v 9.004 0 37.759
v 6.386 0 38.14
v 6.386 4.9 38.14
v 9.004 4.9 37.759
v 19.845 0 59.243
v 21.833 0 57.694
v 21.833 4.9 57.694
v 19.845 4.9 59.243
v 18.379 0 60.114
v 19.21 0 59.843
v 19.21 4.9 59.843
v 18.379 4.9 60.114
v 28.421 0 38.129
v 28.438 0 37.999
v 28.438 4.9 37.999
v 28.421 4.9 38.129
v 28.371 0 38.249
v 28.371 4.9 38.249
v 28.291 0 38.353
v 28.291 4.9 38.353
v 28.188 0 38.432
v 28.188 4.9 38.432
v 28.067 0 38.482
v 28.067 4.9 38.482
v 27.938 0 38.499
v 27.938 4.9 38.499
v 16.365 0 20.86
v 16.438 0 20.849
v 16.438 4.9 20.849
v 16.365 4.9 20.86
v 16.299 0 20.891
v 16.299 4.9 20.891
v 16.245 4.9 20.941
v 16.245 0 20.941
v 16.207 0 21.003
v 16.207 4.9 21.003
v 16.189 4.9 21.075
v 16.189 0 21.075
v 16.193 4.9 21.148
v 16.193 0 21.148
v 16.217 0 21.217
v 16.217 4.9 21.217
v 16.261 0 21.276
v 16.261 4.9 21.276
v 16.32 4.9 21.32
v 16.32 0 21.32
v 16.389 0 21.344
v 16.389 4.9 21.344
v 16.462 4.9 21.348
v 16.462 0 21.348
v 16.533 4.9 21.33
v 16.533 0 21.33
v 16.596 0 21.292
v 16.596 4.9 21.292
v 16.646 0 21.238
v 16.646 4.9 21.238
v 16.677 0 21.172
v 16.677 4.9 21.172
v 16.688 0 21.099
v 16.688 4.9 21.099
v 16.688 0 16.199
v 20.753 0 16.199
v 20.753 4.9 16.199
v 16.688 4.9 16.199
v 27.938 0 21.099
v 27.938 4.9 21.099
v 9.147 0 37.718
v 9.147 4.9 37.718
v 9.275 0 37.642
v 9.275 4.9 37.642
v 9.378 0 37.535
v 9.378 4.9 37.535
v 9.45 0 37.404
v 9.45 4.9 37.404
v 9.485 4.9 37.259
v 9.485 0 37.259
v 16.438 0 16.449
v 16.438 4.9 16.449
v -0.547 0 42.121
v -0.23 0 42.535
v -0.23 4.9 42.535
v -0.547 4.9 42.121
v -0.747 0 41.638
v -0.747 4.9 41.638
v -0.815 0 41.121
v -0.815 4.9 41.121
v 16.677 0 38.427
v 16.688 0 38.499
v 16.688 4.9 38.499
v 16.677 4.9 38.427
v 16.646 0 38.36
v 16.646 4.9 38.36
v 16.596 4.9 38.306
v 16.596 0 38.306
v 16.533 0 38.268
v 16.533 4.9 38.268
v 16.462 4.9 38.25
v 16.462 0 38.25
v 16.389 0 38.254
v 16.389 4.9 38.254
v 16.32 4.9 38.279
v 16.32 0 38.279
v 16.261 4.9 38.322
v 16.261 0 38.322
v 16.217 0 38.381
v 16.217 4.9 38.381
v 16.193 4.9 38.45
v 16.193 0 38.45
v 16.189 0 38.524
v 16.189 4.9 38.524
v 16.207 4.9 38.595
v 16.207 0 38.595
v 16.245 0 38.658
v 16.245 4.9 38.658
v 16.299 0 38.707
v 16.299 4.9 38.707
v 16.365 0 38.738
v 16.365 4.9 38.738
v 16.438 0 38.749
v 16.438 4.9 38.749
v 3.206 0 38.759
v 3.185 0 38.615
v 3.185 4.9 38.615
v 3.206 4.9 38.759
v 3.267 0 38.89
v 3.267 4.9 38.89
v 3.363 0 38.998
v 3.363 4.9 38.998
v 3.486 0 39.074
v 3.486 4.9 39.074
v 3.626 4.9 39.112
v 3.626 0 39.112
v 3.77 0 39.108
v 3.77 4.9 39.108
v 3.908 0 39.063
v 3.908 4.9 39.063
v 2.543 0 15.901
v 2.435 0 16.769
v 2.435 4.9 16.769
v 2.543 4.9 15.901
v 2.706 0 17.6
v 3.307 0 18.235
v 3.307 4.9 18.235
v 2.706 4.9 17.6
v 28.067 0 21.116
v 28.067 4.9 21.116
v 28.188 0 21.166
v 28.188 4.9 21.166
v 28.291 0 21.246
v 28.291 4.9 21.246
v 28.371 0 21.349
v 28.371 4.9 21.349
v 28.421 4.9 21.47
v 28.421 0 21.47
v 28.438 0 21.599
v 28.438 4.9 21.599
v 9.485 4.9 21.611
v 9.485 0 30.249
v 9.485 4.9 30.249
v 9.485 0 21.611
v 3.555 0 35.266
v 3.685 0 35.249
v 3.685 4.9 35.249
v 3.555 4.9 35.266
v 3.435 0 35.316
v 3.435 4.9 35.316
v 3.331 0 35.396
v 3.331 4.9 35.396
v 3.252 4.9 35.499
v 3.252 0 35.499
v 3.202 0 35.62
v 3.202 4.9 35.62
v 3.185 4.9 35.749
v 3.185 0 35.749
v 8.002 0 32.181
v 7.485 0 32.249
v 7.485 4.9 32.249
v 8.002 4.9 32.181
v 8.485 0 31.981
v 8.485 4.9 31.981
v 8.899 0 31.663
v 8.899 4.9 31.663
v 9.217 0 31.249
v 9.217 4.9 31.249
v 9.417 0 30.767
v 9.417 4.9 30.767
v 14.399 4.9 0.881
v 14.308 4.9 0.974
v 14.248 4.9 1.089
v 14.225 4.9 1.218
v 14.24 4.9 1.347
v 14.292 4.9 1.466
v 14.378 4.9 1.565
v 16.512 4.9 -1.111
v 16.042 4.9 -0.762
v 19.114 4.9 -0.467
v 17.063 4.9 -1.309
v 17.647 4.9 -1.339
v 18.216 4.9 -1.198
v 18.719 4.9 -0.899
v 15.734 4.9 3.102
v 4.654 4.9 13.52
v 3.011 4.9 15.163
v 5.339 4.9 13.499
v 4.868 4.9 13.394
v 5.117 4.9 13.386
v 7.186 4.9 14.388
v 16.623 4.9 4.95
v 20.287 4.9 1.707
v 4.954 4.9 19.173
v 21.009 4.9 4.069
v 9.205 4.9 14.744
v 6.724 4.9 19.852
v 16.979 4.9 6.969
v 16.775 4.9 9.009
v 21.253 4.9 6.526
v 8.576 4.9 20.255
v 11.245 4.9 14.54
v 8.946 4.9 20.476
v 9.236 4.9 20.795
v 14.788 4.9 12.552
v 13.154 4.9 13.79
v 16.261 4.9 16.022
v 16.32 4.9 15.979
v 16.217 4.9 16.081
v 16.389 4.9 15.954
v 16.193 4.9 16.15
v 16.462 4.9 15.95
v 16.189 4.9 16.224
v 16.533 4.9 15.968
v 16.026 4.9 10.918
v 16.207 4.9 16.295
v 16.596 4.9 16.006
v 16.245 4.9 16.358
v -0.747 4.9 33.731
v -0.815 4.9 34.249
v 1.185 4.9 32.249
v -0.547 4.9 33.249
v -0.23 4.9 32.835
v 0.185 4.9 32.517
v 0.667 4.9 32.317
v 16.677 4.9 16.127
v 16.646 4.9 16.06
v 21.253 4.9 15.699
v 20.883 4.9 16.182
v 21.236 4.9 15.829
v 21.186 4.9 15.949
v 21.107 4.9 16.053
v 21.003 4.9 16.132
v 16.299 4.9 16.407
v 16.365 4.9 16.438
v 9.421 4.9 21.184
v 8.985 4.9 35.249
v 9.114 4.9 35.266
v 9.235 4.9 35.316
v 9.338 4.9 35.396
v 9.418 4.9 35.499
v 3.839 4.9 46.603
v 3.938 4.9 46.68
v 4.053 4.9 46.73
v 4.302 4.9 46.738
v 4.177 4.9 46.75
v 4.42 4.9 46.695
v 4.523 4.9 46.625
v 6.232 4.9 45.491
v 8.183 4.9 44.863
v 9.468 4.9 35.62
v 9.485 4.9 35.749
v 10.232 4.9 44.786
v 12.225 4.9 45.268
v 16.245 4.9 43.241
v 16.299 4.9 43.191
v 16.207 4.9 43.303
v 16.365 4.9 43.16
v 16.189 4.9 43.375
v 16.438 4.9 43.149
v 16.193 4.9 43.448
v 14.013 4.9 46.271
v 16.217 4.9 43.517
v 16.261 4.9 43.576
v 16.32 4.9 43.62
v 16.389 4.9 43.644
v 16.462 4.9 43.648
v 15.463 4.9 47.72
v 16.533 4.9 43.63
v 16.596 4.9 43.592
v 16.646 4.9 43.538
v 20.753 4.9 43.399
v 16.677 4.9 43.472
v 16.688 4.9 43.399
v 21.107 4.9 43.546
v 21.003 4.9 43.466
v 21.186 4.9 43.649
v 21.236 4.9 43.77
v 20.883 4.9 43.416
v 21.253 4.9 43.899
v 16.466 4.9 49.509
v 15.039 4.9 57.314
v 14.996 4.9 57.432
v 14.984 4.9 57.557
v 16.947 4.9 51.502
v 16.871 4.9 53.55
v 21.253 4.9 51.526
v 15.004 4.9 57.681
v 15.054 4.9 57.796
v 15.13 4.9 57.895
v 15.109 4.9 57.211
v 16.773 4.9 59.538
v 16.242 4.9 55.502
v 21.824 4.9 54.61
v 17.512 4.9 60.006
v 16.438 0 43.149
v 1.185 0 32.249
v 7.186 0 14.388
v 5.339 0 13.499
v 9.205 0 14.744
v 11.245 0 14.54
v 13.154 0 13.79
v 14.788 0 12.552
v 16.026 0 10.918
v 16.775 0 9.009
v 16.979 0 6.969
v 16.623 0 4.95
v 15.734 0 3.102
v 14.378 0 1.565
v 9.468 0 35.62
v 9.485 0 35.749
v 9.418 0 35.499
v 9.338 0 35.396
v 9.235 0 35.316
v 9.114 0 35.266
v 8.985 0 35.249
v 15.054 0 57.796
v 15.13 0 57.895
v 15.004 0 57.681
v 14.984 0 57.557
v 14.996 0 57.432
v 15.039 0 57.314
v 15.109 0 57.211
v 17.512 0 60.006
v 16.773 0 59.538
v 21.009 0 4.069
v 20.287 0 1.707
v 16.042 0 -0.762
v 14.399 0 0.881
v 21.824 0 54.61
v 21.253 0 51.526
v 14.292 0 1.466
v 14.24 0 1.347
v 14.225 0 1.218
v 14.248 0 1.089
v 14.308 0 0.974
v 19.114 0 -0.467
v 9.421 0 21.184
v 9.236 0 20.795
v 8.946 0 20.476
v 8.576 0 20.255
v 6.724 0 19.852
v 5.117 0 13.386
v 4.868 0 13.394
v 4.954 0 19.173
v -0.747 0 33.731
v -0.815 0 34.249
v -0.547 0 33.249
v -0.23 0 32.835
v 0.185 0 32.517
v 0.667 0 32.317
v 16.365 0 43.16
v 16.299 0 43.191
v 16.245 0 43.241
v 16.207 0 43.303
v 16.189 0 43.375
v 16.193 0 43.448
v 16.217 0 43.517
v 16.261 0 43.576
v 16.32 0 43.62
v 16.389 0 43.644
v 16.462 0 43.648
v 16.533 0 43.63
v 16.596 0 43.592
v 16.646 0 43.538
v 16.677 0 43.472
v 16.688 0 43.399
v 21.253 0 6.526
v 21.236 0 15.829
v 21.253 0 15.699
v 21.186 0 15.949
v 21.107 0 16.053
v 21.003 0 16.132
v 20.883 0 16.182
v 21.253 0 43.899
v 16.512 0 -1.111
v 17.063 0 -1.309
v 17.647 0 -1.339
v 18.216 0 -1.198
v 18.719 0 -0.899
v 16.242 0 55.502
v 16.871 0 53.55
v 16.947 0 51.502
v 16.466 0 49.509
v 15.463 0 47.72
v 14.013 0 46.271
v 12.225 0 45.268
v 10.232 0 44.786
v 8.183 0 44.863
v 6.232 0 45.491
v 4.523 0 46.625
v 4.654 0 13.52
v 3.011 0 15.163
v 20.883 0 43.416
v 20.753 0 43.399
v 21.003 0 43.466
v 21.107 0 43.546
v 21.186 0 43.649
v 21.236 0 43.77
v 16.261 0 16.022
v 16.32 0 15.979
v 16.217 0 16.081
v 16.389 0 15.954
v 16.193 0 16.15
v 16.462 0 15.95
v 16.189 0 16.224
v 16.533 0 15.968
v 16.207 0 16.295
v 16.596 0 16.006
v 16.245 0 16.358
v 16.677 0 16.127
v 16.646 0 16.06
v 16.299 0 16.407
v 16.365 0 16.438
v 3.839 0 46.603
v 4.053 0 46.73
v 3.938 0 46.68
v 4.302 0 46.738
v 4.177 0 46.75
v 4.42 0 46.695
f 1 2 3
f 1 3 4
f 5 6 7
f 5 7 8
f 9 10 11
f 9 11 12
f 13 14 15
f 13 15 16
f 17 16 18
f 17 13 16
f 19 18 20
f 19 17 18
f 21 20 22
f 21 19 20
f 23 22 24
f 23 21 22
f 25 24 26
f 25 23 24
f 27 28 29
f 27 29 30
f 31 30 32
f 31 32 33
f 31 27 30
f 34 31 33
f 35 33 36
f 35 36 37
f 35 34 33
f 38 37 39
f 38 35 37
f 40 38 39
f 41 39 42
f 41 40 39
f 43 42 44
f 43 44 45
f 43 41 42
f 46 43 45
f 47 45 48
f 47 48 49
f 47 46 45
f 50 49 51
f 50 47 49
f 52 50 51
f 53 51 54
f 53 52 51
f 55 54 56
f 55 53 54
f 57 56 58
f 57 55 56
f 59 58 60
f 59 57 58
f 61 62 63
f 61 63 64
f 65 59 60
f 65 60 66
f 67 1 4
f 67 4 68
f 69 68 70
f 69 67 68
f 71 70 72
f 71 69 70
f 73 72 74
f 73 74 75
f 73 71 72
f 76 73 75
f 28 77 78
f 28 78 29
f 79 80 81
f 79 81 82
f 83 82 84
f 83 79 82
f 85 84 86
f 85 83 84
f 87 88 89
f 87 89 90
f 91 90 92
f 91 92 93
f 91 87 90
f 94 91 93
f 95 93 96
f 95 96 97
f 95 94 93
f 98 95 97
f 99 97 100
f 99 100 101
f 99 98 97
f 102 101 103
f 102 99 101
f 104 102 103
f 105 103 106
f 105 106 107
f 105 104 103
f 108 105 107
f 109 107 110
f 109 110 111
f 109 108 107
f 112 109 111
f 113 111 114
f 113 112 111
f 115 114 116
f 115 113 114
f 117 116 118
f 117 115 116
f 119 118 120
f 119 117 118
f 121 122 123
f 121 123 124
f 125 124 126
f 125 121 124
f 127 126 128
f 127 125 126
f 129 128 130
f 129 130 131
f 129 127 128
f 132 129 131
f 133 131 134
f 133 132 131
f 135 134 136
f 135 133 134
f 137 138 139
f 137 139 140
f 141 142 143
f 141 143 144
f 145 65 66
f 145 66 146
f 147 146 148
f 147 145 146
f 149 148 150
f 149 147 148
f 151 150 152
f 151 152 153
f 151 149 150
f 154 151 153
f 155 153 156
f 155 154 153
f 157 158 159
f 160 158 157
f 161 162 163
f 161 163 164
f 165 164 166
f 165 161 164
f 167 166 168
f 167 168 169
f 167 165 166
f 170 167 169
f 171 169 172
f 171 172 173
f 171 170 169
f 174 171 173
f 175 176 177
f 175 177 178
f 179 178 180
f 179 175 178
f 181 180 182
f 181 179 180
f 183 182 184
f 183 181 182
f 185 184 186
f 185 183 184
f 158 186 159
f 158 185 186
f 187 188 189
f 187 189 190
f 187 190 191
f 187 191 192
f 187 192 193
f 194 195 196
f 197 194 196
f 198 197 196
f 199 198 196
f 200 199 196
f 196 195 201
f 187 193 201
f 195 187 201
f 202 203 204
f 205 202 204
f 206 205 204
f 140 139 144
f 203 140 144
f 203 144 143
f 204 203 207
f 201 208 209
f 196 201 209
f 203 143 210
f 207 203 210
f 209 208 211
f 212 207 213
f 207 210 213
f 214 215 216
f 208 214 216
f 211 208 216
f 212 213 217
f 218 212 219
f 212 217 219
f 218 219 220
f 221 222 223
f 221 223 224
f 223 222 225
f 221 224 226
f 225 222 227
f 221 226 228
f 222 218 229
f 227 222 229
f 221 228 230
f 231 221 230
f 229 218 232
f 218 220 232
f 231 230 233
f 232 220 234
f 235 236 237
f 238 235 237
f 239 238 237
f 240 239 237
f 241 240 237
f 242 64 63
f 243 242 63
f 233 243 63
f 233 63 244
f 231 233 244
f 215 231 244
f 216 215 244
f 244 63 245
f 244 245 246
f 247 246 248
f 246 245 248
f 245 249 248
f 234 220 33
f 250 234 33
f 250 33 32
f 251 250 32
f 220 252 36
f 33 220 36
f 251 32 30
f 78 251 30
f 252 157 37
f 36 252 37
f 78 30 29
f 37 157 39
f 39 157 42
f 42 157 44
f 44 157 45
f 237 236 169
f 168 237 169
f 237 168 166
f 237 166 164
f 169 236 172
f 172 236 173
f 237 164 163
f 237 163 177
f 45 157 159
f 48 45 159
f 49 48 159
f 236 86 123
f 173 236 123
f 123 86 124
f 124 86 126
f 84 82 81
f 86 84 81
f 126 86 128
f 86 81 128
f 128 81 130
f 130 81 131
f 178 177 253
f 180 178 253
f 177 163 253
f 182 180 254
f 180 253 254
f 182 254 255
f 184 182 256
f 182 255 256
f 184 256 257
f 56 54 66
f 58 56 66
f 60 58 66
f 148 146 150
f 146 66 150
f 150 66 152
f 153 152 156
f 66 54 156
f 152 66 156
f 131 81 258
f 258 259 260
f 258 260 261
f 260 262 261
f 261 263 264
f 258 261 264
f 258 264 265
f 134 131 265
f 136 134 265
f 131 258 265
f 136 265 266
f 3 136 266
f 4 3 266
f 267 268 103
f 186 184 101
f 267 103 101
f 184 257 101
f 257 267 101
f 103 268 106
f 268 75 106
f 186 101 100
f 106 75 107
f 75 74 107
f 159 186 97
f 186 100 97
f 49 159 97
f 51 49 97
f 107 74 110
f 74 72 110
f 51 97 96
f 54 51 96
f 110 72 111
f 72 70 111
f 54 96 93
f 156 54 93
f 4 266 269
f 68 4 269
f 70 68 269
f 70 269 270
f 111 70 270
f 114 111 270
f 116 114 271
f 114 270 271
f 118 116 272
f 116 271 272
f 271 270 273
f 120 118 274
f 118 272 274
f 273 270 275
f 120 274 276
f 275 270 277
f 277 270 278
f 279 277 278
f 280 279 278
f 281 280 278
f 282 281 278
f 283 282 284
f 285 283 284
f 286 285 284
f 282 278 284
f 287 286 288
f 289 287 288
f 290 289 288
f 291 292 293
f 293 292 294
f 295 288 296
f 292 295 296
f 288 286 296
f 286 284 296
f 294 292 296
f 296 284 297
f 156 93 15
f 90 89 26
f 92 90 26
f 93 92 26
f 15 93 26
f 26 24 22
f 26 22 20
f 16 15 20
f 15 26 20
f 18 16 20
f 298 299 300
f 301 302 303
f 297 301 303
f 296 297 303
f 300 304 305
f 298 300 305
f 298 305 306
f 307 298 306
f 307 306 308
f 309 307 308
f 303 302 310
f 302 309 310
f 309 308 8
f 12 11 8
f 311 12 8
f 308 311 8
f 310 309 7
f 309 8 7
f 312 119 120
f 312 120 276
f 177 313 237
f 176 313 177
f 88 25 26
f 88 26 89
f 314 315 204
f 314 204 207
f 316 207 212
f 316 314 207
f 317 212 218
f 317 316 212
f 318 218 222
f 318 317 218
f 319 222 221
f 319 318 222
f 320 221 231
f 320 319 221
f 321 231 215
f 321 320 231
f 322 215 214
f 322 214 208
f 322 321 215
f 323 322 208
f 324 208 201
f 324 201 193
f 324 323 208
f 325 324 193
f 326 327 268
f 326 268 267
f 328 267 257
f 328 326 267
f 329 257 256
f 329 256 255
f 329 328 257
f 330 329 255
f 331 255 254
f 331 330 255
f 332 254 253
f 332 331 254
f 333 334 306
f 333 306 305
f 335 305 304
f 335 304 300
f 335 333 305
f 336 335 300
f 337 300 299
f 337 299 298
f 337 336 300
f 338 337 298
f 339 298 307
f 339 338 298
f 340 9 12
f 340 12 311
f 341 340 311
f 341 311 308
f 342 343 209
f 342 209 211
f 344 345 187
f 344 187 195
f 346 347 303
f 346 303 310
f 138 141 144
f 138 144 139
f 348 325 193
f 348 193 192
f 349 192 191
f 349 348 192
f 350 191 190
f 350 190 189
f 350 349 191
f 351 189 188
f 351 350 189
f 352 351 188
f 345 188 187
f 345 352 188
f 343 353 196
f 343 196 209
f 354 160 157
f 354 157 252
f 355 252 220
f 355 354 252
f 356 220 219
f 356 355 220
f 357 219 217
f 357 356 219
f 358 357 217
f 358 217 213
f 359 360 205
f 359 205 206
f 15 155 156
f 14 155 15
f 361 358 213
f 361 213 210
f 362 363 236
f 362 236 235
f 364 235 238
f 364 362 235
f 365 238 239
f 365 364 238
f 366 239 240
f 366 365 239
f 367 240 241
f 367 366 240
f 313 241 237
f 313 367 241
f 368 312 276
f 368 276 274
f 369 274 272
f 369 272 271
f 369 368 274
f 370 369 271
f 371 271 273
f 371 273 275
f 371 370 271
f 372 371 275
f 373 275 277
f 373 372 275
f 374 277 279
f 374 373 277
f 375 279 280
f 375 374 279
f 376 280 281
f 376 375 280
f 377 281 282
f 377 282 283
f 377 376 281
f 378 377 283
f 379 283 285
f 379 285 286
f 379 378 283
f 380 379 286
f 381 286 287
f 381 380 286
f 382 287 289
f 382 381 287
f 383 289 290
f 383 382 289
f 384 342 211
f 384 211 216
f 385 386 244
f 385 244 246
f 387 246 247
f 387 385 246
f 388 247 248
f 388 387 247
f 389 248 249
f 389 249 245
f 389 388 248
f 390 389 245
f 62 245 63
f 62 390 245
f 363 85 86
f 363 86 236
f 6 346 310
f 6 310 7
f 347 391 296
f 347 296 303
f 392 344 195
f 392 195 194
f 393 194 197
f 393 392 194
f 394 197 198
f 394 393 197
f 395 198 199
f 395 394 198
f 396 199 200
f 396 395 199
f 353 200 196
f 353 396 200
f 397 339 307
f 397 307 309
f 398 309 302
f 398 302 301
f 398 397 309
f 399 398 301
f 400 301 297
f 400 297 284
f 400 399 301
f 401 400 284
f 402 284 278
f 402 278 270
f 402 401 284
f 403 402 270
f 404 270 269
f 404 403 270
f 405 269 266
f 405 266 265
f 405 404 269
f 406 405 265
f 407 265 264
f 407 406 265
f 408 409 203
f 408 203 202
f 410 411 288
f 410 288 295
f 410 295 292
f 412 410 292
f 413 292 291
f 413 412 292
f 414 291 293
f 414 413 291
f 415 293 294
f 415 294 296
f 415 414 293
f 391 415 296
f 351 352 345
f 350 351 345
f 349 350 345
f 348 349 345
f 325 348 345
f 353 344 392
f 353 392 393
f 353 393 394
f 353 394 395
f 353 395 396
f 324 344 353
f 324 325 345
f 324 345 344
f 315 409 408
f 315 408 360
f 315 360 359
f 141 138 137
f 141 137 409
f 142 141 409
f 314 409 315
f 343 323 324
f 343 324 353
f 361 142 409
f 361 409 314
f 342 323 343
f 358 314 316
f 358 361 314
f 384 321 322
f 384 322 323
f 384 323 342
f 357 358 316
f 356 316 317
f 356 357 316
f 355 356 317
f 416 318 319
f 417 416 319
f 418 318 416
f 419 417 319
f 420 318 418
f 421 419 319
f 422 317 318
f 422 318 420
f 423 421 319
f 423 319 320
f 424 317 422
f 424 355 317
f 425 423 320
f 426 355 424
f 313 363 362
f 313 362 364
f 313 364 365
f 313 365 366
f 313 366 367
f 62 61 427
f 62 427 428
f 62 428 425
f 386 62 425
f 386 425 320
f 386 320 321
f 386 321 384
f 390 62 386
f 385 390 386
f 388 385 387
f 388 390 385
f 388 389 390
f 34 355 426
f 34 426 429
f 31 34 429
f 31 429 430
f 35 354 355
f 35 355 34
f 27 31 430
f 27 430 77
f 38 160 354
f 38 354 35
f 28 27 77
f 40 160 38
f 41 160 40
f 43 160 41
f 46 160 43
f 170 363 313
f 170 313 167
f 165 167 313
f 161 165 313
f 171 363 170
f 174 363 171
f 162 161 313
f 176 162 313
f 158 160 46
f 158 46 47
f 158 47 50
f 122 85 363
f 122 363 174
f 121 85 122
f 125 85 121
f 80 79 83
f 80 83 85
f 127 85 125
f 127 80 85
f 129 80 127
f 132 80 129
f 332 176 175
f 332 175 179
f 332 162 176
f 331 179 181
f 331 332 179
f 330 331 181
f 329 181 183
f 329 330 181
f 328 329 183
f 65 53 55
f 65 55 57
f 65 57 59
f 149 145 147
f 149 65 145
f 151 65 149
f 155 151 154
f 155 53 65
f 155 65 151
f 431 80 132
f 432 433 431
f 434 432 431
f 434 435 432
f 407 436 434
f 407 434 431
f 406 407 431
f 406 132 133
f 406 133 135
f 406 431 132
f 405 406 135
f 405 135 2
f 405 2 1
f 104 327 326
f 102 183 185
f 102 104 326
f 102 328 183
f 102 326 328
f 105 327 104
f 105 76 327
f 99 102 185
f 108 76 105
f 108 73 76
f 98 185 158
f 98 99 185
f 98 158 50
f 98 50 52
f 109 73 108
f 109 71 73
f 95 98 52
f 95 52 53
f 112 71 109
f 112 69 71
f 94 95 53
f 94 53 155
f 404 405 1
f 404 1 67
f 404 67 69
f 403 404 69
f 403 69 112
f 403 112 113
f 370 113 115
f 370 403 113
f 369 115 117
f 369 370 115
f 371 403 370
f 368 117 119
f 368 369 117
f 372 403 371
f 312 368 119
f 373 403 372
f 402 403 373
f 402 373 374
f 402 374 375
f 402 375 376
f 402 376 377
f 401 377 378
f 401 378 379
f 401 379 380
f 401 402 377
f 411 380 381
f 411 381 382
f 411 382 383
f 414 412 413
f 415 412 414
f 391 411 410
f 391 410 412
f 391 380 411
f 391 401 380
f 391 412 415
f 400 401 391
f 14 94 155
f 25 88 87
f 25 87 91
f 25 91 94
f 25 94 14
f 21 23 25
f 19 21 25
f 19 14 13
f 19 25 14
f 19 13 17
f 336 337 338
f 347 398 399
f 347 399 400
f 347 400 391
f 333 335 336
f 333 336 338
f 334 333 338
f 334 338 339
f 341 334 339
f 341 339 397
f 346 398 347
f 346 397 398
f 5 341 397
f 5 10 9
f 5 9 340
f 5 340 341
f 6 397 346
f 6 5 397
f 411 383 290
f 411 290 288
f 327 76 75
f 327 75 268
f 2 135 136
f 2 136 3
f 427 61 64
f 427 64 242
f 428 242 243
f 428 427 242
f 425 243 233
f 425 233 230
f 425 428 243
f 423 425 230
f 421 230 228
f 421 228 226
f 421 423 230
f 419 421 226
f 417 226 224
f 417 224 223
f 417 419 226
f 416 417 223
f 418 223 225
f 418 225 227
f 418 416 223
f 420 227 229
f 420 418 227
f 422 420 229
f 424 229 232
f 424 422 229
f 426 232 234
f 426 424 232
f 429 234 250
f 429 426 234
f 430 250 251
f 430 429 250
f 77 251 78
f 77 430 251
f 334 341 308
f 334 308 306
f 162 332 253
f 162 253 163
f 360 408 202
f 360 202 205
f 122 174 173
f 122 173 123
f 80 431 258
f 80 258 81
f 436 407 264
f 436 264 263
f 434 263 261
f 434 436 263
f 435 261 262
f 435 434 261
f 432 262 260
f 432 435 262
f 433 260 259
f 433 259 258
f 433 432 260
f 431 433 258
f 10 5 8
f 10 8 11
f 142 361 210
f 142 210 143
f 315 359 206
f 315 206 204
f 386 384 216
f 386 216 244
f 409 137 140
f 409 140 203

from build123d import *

# Parameters (mm, degrees)
BOSS_EXTRU_1_DEPTH = 4.900038


with BuildPart() as part:
    # Esquisse1 → Boss.-Extru.1 (new body)
    with BuildSketch(Plane.XZ):
        with BuildLine():
            Line((-0.815337621, 41.120678267), (-0.815337621, 34.249109833))
            ThreePointArc((-0.815337621, 34.249109833), (-0.229551316, 32.834896593), (1.184661924, 32.249110289))
            Line((1.184661924, 32.249110289), (7.484661488, 32.249110289))
            ThreePointArc((7.484661488, 32.249110289), (8.898874021, 31.663324278), (9.484660032, 30.249111745))
            Line((9.484660032, 30.249111745), (9.484660032, 21.610522714))
            ThreePointArc((9.484660032, 21.610522714), (9.236435528, 20.794530717), (8.575860046, 20.254995384))
            Line((8.575860046, 20.254995384), (6.723618468, 19.851925476))
            Line((6.723618468, 19.851925476), (4.953621871, 19.173415631))
            Line((4.953621871, 19.173415631), (3.306576246, 18.235075845))
            Line((3.306576246, 18.235075845), (2.706450383, 17.599525989))
            Line((2.706450383, 17.599525989), (2.434698445, 16.768726179))
            Line((2.434698445, 16.768726179), (2.54322942, 15.901386376))
            Line((2.54322942, 15.901386376), (3.011310314, 15.163166545))
            Line((3.011310314, 15.163166545), (4.654204939, 13.520266919))
            Line((4.654204939, 13.520266919), (4.868308891, 13.393666948))
            Line((4.868308891, 13.393666948), (5.116923834, 13.38588695))
            Line((5.116923834, 13.38588695), (5.338521783, 13.498866924))
            ThreePointArc((5.338521783, 13.498866924), (15.463306351, 11.777438967), (14.377512906, 1.564915804))
            ThreePointArc((14.377512906, 1.564915804), (14.224756538, 1.21764125), (14.398922901, 0.88059496))
            Line((14.398922901, 0.88059496), (16.041812526, -0.762298665))
            ThreePointArc((16.041812526, -0.762298665), (17.647380358, -1.33891093), (19.113721826, -0.467032233))
            Line((19.113721826, -0.467032233), (20.286561559, 1.706666772))
            Line((20.286561559, 1.706666772), (21.009101394, 4.068549234))
            Line((21.009101394, 4.068549234), (21.253121339, 6.526390674))
            Line((21.253121339, 6.526390674), (21.253121339, 15.699105144))
            ThreePointArc((21.253121339, 15.699105144), (21.106674763, 16.052658454), (20.753121453, 16.19910503))
            Line((20.753121453, 16.19910503), (16.687787672, 16.19910503))
            ThreePointArc((16.687787672, 16.19910503), (16.261005783, 16.022326184), (16.43778463, 16.449108073))
            Line((16.43778463, 16.449108073), (16.43778463, 20.849107628))
            ThreePointArc((16.43778463, 20.849107628), (16.261009771, 21.275879889), (16.687782032, 21.09910503))
            Line((16.687782032, 21.09910503), (27.937782009, 21.09910503))
            ThreePointArc((27.937782009, 21.09910503), (28.291335319, 21.245551606), (28.437781895, 21.599104916))
            Line((28.437781895, 21.599104916), (28.437781895, 37.999105144))
            ThreePointArc((28.437781895, 37.999105144), (28.291335319, 38.352658454), (27.937782009, 38.49910503))
            Line((27.937782009, 38.49910503), (16.687785131, 38.49910503))
            ThreePointArc((16.687785131, 38.49910503), (16.26100758, 38.322327981), (16.43778463, 38.749105532))
            Line((16.43778463, 38.749105532), (16.43778463, 43.14910503))
            ThreePointArc((16.43778463, 43.14910503), (16.261007934, 43.575881726), (16.68778463, 43.39910503))
            Line((16.68778463, 43.39910503), (20.753121453, 43.39910503))
            ThreePointArc((20.753121453, 43.39910503), (21.106674763, 43.545551606), (21.253121339, 43.899104916))
            Line((21.253121339, 43.899104916), (21.253121339, 51.526382419))
            Line((21.253121339, 51.526382419), (21.824434721, 54.609591947))
            Line((21.824434721, 54.609591947), (21.833435025, 57.694186853))
            Line((21.833435025, 57.694186853), (19.84525724, 59.242523707))
            Line((19.84525724, 59.242523707), (19.209707385, 59.84265357))
            Line((19.209707385, 59.84265357), (18.378917574, 60.114403508))
            Line((18.378917574, 60.114403508), (17.511567772, 60.005873533))
            Line((17.511567772, 60.005873533), (16.77334794, 59.537793639))
            Line((16.77334794, 59.537793639), (15.130452537, 57.894888236))
            ThreePointArc((15.130452537, 57.894888236), (14.984254305, 57.556974361), (15.109048319, 57.21058417))
            ThreePointArc((15.109048319, 57.21058417), (14.787965349, 46.945806953), (4.52318847, 46.624713214))
            ThreePointArc((4.52318847, 46.624713214), (4.176789338, 46.749509832), (3.838867319, 46.603307018))
            Line((3.838867319, 46.603307018), (-0.229554407, 42.534884292))
            ThreePointArc((-0.229554407, 42.534884292), (-0.663097525, 41.886041033), (-0.815337621, 41.120678267))
        make_face()
        with BuildLine():
            Line((9.484660032, 37.259480615), (9.484660032, 35.749109175))
            ThreePointArc((9.484660032, 35.749109175), (9.338213749, 35.395556572), (8.984661146, 35.249110289))
            Line((8.984661146, 35.249110289), (3.684660032, 35.249110289))
            ThreePointArc((3.684660032, 35.249110289), (3.331106642, 35.395556899), (3.184660032, 35.749110289))
            Line((3.184660032, 35.749110289), (3.184660032, 38.615420306))
            ThreePointArc((3.184660032, 38.615420306), (3.421541448, 39.040593437), (3.907737867, 39.062910204))
            Line((3.907737867, 39.062910204), (6.386454303, 38.139900415))
            Line((6.386454303, 38.139900415), (9.003891164, 37.759110289))
            ThreePointArc((9.003891164, 37.759110289), (9.329866443, 37.591655279), (9.484660032, 37.259480615))
        make_face(mode=Mode.SUBTRACT)
    extrude(amount=-BOSS_EXTRU_1_DEPTH)


solid = part.part
